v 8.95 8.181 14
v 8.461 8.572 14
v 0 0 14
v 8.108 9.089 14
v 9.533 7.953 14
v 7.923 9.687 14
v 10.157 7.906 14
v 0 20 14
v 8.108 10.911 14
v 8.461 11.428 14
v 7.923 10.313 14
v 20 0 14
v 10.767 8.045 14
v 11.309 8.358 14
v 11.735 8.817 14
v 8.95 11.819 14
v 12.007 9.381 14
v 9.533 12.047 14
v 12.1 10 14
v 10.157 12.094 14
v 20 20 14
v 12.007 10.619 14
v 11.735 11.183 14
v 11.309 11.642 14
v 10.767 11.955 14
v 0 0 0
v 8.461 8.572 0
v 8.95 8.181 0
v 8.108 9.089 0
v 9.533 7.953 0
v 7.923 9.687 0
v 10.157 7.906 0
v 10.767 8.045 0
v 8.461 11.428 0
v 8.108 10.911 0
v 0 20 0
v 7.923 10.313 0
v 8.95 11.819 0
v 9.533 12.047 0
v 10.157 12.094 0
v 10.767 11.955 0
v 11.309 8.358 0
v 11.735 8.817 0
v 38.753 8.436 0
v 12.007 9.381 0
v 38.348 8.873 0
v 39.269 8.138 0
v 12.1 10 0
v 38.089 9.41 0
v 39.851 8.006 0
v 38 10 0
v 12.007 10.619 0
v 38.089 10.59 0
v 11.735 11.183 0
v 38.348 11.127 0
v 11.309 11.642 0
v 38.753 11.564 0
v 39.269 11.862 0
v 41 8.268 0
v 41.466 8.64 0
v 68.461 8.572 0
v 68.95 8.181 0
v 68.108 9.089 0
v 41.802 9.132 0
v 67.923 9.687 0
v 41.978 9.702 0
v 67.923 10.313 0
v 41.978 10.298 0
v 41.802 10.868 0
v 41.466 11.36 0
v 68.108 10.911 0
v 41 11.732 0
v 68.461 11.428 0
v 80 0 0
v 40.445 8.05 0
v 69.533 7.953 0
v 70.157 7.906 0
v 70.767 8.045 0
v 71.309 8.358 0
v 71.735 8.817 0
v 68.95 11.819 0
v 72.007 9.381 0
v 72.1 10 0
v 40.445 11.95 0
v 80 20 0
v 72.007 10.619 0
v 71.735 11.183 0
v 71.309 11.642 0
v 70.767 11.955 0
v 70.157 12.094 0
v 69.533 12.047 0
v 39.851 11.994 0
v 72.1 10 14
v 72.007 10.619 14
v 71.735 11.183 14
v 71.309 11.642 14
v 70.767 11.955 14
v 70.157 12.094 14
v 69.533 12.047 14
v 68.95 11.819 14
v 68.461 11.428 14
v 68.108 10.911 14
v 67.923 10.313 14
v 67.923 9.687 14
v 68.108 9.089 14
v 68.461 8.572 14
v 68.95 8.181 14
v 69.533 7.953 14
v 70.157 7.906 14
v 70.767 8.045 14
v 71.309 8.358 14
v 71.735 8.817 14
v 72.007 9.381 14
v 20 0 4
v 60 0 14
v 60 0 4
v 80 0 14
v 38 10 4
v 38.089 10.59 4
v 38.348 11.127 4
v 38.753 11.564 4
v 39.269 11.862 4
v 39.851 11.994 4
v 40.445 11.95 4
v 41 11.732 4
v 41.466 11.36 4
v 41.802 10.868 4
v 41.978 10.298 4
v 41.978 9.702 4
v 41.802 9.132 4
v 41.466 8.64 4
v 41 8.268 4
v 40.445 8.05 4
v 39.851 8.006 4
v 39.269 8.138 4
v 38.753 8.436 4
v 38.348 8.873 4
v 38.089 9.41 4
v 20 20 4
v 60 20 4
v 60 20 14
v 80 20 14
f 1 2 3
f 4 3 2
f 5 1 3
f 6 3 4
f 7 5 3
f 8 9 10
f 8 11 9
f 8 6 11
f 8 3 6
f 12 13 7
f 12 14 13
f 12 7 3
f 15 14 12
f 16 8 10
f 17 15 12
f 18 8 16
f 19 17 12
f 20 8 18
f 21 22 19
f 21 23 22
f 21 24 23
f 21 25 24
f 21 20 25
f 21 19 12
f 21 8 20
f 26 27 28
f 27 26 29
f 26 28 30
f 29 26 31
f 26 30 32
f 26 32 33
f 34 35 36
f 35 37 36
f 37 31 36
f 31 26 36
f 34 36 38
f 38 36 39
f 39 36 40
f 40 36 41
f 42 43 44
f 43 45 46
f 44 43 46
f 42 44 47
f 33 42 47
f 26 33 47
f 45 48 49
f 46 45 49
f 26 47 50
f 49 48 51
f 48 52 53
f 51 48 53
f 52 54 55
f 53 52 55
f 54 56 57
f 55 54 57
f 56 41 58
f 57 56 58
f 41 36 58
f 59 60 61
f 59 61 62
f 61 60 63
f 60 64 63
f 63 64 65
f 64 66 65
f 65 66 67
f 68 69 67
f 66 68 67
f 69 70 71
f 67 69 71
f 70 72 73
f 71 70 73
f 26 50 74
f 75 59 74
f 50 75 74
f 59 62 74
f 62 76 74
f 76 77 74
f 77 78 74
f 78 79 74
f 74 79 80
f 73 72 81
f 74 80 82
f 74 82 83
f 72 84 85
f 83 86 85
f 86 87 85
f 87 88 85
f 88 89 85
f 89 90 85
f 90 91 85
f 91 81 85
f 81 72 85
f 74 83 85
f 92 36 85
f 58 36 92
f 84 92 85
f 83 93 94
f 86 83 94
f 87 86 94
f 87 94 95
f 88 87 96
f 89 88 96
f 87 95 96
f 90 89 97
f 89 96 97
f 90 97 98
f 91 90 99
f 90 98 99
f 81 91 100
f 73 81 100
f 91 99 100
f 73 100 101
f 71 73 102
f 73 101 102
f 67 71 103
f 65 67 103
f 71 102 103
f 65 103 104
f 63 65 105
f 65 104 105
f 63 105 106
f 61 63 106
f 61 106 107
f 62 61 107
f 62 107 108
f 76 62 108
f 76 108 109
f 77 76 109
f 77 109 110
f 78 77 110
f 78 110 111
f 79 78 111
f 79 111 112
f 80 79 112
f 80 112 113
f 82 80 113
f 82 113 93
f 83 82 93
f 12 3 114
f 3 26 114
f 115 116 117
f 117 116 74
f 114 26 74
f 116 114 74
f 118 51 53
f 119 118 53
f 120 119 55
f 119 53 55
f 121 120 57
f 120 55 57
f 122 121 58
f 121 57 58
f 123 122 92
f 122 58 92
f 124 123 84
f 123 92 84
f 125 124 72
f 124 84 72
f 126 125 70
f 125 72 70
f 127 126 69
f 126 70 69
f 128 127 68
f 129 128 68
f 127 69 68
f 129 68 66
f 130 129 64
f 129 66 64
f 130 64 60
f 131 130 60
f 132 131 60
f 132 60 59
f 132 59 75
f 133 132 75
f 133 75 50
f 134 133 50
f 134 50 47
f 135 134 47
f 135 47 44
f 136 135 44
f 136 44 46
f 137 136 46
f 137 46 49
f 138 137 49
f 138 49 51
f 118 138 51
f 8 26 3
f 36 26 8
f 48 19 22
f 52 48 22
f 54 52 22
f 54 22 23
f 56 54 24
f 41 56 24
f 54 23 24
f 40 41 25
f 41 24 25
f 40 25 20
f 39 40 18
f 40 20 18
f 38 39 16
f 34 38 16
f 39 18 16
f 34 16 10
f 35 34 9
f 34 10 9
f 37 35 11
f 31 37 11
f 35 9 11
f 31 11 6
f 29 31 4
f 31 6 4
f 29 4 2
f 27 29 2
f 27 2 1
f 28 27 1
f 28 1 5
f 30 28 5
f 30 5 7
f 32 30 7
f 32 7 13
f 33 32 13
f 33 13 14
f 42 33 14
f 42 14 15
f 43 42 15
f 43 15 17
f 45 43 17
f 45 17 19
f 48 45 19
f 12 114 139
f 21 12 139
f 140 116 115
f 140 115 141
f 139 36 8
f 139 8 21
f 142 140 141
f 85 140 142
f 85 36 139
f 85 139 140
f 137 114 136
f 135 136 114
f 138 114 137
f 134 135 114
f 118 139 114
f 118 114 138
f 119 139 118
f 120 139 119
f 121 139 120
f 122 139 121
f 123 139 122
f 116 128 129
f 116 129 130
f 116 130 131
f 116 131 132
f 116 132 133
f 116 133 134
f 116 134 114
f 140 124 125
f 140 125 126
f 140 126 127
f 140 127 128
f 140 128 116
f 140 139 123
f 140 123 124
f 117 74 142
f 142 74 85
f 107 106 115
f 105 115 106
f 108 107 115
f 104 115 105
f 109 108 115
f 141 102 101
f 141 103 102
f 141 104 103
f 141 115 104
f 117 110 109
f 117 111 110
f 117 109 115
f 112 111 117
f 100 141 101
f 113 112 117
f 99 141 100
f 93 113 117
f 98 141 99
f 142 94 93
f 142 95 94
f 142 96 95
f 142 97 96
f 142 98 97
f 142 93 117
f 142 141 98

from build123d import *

# Parameters (mm, degrees)
SKETCH_1_W          = 80
SKETCH_1_H          = 20
EXTRUDE_1_DEPTH     = 4
SKETCH_2_W          = 20
SKETCH_2_H          = 20
EXTRUDE_2_DEPTH     = 10
SKETCH_3_R          = 2.1
CUT_EXTRUDE_1_DEPTH = 20
SKETCH_4_R          = 2
CUT_EXTRUDE_2_DEPTH = 20


with BuildPart() as part:
    # 草图1 → 凸台-拉伸1 (new body)
    with BuildSketch(Plane.XY):
        with Locations((40, 10)):
            Rectangle(SKETCH_1_W, SKETCH_1_H)
    extrude(amount=EXTRUDE_1_DEPTH)

    # 草图2 → 凸台-拉伸2 (add)
    with BuildSketch(Plane.XY.offset(4)):
        with Locations((10, 10)):
            Rectangle(SKETCH_2_W, SKETCH_2_H)
        with Locations((70, 10)):
            Rectangle(SKETCH_2_W, SKETCH_2_H)
    extrude(amount=EXTRUDE_2_DEPTH)

    # 草图3 → 切除-拉伸1 (cut)
    with BuildSketch(Plane.XY.offset(14)):
        with Locations((10, 10)):
            Circle(SKETCH_3_R)
        with Locations((70, 10)):
            Circle(SKETCH_3_R)
    extrude(amount=-CUT_EXTRUDE_1_DEPTH, mode=Mode.SUBTRACT)

    # 草图4 → 切除-拉伸2 (cut)
    with BuildSketch(Plane(origin=(0, 0, 0), x_dir=(-1, 0, 0), z_dir=(0, 0, -1))):
        with Locations((-40, 10)):
            Circle(SKETCH_4_R)
    extrude(amount=-CUT_EXTRUDE_2_DEPTH, mode=Mode.SUBTRACT)


solid = part.part
